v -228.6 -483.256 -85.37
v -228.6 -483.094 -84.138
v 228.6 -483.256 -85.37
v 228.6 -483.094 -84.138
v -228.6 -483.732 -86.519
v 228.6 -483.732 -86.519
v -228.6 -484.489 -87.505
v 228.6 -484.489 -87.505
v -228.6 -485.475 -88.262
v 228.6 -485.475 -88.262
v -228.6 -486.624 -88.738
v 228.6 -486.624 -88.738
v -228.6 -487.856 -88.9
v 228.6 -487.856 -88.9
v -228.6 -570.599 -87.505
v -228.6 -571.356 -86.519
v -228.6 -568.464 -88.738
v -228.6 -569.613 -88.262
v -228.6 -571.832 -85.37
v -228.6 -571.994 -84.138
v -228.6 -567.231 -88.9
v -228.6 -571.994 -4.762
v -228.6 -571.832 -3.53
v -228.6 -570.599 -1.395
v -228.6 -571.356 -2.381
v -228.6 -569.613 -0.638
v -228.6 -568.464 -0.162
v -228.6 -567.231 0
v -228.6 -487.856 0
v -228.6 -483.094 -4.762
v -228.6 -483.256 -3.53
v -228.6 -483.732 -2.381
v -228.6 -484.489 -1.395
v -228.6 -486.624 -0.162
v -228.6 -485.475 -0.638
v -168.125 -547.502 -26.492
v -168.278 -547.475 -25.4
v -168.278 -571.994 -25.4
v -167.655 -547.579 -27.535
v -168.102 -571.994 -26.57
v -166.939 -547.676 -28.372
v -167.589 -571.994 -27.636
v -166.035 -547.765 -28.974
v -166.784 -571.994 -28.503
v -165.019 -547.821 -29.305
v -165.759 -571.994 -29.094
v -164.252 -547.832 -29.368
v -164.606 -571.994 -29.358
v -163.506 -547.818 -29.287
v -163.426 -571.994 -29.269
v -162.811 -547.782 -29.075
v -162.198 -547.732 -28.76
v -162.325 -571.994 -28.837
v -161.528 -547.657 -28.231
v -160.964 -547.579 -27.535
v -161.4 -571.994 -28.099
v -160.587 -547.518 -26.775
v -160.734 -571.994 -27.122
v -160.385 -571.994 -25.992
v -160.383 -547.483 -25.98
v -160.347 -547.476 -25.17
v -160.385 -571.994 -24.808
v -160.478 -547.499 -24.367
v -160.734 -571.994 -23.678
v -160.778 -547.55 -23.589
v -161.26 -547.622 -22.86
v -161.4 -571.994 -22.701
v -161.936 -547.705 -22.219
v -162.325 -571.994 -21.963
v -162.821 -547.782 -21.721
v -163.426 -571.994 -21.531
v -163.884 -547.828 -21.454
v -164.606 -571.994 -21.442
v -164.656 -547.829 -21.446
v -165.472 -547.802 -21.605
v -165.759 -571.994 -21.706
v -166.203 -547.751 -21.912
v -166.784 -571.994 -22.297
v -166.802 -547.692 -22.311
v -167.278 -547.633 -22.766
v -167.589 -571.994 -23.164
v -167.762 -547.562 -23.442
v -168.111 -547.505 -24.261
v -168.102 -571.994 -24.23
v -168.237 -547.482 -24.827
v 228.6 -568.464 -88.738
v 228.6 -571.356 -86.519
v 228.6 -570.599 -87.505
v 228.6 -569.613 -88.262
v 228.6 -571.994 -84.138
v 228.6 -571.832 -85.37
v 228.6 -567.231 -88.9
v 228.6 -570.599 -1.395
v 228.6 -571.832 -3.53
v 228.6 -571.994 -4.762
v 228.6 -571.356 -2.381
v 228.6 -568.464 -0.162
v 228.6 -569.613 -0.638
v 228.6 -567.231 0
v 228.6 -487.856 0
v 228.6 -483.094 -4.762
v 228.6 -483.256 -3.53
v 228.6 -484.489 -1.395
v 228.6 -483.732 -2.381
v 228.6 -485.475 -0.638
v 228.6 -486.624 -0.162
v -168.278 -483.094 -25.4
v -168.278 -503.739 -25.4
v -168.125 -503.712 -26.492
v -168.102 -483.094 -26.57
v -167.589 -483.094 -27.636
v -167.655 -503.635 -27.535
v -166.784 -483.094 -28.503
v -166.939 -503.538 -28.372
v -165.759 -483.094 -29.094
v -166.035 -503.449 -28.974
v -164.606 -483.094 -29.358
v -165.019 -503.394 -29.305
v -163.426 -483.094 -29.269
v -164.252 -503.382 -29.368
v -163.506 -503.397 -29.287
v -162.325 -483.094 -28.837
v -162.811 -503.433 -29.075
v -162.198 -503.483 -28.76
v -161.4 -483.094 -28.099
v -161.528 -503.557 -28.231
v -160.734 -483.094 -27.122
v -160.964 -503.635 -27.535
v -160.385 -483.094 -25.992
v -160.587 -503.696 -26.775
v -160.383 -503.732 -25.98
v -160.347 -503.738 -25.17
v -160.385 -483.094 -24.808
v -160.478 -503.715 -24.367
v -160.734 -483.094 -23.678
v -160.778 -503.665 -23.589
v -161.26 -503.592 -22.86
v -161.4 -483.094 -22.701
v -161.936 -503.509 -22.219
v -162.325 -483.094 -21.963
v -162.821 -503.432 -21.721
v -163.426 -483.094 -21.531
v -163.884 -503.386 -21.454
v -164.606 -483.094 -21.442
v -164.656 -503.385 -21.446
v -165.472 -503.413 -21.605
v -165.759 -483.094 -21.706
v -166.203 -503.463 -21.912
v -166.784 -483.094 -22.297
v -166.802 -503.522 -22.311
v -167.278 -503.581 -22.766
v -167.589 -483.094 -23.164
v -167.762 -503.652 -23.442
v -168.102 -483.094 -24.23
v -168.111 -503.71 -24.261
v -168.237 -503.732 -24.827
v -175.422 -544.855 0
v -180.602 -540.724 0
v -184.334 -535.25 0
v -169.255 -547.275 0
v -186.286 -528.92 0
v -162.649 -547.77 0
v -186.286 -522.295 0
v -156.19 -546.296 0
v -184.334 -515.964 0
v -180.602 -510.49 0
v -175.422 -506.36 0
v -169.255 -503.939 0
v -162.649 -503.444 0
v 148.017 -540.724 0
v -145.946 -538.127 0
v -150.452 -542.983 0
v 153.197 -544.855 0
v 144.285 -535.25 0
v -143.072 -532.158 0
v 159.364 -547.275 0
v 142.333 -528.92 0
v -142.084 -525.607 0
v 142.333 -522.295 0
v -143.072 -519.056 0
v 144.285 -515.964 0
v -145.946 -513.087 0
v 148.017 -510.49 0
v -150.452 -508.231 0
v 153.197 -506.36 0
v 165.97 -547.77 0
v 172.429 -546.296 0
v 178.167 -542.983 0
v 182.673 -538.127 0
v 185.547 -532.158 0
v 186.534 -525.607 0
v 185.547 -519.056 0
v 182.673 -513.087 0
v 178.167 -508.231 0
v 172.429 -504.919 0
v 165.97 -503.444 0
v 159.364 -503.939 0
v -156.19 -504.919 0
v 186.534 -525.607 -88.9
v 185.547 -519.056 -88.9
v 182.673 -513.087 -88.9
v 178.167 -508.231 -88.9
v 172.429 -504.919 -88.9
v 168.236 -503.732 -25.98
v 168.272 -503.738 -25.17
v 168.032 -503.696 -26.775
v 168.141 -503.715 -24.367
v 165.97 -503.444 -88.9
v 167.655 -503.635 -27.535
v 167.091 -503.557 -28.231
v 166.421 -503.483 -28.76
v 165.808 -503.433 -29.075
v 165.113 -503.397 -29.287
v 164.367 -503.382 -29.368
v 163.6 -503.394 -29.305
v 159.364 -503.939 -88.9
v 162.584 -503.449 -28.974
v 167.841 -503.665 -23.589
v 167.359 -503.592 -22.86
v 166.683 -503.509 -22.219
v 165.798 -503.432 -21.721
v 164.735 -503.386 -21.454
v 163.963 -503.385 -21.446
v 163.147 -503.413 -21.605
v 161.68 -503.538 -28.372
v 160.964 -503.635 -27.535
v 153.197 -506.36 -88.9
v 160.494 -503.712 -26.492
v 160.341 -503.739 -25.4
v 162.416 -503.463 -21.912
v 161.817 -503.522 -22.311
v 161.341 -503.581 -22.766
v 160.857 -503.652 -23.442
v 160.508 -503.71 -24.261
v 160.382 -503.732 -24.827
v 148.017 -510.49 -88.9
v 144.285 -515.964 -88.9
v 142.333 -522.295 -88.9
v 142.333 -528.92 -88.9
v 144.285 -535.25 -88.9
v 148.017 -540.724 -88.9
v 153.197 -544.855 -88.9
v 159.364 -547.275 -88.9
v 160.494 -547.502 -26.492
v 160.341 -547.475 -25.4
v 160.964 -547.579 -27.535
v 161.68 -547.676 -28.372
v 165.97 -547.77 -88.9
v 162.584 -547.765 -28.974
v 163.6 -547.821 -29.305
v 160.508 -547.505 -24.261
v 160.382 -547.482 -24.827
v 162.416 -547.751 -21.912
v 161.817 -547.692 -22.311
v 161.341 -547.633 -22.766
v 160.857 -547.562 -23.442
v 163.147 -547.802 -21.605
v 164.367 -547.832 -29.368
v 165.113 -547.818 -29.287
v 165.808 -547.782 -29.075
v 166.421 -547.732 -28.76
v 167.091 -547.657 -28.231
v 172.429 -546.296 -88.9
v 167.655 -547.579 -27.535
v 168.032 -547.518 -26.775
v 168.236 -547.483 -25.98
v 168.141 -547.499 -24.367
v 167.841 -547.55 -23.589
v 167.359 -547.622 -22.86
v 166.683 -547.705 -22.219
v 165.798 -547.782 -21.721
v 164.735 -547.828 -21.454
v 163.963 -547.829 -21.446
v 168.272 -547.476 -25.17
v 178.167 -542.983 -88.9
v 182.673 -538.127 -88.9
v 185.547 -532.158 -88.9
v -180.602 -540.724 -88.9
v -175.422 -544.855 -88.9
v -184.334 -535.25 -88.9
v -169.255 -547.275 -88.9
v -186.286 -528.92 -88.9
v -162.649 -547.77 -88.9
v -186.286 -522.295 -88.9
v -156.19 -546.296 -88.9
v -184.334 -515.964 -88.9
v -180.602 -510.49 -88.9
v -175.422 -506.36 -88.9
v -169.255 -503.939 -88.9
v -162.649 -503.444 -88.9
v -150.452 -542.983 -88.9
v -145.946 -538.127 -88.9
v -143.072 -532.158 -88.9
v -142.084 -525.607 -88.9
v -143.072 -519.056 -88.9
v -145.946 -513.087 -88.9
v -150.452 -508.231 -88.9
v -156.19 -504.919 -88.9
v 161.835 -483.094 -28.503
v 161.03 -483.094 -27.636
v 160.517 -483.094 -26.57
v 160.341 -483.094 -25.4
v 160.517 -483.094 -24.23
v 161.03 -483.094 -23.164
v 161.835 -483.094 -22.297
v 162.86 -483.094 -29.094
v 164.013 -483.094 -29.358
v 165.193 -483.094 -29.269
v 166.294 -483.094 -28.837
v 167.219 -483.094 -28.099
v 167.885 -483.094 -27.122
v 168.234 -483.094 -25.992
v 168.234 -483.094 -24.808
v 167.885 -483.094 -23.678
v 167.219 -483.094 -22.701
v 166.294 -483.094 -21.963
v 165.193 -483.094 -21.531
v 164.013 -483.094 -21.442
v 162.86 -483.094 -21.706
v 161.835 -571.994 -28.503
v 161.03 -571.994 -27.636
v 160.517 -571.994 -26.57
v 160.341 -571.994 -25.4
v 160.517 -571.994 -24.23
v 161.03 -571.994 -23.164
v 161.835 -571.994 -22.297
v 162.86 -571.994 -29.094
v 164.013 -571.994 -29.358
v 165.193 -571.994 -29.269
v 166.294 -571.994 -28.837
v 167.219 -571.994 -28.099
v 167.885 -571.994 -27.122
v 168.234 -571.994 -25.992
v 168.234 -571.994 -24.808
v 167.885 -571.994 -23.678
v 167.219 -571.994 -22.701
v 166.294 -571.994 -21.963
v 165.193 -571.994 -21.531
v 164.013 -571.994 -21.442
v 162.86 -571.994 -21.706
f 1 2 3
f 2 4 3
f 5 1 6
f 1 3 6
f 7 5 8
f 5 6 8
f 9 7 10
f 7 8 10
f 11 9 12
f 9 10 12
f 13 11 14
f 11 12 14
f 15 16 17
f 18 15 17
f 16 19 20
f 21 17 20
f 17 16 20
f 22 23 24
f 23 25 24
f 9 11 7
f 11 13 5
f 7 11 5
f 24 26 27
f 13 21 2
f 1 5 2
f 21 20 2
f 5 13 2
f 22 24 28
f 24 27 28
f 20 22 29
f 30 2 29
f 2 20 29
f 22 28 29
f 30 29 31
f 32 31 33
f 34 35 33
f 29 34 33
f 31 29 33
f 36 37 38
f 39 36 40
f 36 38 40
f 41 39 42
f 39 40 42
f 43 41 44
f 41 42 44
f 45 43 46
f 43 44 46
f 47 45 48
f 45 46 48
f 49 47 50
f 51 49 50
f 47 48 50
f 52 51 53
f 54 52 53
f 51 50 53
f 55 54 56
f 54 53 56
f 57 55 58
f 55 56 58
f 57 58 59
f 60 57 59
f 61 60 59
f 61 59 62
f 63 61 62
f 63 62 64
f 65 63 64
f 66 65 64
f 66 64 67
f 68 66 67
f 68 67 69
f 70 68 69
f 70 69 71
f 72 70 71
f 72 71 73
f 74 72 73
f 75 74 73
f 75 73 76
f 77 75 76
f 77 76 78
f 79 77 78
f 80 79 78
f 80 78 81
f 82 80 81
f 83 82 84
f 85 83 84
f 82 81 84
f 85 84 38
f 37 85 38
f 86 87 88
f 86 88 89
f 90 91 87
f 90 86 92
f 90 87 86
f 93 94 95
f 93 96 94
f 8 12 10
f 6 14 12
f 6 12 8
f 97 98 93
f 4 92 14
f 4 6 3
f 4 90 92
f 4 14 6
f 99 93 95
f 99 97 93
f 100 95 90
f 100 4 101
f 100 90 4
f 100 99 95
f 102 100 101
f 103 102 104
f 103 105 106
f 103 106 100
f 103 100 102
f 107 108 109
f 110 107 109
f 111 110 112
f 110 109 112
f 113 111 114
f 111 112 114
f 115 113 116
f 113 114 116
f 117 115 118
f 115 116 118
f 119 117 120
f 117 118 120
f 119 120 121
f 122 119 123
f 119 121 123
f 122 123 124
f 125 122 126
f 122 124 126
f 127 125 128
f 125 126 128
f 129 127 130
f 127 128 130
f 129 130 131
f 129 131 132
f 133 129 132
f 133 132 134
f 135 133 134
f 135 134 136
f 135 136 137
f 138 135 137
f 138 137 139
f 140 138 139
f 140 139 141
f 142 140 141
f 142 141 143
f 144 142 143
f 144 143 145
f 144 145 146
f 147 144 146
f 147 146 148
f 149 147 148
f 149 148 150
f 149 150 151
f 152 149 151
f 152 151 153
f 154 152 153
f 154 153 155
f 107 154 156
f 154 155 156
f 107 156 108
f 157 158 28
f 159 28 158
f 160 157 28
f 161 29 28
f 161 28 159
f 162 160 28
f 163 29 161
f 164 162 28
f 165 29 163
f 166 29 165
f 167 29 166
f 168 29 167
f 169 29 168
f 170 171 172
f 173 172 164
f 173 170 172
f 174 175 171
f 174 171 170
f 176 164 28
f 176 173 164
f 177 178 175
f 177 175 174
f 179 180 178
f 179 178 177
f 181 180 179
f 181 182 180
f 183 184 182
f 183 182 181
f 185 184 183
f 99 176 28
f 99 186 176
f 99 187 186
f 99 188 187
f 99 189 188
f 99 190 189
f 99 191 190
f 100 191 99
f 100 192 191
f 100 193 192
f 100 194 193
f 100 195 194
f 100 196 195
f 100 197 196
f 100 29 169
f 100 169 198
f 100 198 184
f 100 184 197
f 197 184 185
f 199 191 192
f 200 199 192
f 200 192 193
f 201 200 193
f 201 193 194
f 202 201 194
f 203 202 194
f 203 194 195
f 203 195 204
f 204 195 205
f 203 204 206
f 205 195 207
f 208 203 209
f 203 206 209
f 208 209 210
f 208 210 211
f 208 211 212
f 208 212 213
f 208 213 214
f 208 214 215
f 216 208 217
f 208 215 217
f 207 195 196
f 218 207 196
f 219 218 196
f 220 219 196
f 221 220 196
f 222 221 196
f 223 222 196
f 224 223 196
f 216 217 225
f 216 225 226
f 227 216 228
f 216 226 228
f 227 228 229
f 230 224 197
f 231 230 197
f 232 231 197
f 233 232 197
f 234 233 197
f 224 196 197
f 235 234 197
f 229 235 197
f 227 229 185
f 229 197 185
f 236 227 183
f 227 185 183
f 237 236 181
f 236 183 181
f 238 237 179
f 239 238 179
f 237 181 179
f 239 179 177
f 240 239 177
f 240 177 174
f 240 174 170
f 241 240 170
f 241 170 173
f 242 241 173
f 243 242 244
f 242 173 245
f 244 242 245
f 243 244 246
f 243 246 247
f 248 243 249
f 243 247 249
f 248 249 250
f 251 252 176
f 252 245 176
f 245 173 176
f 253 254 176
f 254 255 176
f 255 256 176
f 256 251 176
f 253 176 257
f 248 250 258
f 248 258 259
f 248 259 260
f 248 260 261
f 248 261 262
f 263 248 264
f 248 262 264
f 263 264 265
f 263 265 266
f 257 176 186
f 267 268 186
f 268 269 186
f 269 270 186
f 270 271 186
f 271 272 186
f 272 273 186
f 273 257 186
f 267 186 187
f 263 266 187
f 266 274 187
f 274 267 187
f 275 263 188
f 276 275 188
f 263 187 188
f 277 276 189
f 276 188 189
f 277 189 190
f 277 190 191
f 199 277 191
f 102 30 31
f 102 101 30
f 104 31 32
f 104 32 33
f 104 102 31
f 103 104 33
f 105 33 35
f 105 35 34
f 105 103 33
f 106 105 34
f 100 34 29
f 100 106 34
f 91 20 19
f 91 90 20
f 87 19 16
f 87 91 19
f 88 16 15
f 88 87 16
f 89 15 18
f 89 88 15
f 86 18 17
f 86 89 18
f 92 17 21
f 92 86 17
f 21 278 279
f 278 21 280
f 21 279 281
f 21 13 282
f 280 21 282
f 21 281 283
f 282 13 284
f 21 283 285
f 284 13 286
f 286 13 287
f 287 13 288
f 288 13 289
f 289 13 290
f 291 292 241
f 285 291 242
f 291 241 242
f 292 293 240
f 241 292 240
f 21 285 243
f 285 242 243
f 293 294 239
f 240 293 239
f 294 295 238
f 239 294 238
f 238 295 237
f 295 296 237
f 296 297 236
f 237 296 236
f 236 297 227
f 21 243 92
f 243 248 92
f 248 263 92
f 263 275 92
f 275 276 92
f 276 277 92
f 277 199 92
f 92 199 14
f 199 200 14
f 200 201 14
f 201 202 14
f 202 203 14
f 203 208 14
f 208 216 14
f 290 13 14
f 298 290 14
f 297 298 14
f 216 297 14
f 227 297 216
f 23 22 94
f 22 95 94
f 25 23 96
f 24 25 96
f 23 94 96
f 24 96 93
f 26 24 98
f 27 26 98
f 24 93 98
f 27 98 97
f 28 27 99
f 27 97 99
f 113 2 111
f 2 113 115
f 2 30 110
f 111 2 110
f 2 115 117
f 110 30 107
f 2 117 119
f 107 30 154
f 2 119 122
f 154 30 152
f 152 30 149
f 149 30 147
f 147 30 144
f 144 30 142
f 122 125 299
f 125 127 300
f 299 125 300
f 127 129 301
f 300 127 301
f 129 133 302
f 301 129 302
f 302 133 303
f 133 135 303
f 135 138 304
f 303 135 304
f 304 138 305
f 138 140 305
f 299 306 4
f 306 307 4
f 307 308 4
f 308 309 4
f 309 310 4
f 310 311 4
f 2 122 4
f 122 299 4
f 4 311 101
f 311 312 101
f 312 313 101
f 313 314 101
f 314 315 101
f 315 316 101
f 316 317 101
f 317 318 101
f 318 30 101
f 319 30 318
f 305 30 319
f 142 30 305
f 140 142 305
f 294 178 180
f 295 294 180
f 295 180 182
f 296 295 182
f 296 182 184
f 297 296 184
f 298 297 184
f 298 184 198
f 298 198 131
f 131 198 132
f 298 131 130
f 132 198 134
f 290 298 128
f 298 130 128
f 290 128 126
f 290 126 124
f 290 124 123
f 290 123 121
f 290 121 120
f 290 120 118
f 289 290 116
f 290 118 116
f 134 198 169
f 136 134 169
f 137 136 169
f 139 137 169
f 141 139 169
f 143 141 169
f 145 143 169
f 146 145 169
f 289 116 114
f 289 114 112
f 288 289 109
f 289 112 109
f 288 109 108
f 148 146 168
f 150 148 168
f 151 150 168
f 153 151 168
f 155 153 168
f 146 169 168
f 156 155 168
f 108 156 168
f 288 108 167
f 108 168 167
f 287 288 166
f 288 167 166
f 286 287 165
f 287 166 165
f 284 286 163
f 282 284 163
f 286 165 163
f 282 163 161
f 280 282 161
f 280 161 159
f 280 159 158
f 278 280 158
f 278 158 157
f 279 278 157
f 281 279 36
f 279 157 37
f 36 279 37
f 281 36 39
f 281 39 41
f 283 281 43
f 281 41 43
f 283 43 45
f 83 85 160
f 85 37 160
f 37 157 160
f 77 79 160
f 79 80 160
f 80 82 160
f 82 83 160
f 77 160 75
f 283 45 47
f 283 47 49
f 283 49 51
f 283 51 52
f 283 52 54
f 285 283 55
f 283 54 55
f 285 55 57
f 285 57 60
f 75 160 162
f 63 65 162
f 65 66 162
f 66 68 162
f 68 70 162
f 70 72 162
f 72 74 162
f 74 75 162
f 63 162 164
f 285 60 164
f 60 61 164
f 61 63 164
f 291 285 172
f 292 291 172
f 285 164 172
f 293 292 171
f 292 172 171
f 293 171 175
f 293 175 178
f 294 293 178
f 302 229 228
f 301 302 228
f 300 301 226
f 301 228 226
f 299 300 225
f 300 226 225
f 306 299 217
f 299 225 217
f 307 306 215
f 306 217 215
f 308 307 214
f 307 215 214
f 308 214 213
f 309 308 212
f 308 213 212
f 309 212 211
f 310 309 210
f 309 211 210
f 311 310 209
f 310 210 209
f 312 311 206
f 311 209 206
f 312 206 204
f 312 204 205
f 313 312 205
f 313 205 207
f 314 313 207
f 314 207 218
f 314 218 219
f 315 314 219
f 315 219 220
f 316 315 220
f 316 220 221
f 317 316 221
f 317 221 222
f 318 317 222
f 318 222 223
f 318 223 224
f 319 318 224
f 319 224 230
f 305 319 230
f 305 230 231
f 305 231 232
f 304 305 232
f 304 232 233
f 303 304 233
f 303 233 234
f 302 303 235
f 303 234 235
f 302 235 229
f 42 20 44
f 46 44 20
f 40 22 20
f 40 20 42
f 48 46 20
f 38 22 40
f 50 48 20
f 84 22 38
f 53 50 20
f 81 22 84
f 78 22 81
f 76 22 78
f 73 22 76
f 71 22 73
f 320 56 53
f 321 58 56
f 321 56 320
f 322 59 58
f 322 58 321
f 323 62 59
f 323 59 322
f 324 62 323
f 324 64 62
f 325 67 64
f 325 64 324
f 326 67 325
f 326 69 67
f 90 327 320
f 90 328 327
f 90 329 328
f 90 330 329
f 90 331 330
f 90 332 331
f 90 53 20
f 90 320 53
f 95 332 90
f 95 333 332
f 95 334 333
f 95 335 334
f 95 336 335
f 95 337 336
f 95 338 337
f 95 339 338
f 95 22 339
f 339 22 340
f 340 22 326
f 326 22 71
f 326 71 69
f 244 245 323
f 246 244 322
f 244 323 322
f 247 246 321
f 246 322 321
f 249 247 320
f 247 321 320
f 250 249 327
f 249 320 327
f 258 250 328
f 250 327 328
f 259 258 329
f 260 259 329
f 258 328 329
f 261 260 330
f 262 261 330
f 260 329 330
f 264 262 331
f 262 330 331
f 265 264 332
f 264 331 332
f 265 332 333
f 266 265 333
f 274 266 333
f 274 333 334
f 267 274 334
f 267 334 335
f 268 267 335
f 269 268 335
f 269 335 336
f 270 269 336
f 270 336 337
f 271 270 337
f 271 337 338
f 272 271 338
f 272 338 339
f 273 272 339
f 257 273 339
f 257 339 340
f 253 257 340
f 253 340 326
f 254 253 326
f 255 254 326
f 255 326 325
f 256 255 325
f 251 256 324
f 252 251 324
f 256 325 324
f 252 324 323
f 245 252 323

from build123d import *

# Parameters (mm, degrees)
SKETCH1_W                      = 457.2
SKETCH1_H                      = 88.9
BOSS_EXTRUDE1_DEPTH            = 88.9
SKETCH2_R                      = 22.225
CUT_EXTRUDE1_DEPTH             = 89.9
F_5_16_0_3125_DIAMETER_HOLE1_D = 7.9375
FILLET1_R                      = 4.7625


with BuildPart() as part:
    # Sketch1 → Boss-Extrude1 (new body)
    with BuildSketch(Plane.XY):
        with Locations((0, -527.543937925)):
            Rectangle(SKETCH1_W, SKETCH1_H)
    extrude(amount=-BOSS_EXTRUDE1_DEPTH)

    # Sketch2 → Cut-Extrude1 (cut, through all)
    with BuildSketch(Plane.XY):
        with Locations((164.309496882, -525.607187925)):
            Circle(SKETCH2_R)
        with Locations((-164.309496882, -525.607187925)):
            Circle(SKETCH2_R)
    extrude(amount=-CUT_EXTRUDE1_DEPTH, mode=Mode.SUBTRACT)

    # 5/16 (0.3125) Diameter Hole1 (through all)
    with Locations(Plane(origin=(0, -483.093937925, 0), x_dir=(1, 0, 0), z_dir=(0, 1, 0))):
        with Locations((-164.309496882, 25.4), (164.309496882, 25.4)):
            Hole(F_5_16_0_3125_DIAMETER_HOLE1_D / 2)

    # Fillet1
    fillet1_edges = [part.edges().sort_by_distance(p)[0] for p in [
        (0, -483.093937925, 0),
        (0, -571.993937925, -88.9),
        (0, -483.093937925, -88.9),
        (0, -571.993937925, 0),
    ]]
    fillet(fillet1_edges, radius=FILLET1_R)


solid = part.part
